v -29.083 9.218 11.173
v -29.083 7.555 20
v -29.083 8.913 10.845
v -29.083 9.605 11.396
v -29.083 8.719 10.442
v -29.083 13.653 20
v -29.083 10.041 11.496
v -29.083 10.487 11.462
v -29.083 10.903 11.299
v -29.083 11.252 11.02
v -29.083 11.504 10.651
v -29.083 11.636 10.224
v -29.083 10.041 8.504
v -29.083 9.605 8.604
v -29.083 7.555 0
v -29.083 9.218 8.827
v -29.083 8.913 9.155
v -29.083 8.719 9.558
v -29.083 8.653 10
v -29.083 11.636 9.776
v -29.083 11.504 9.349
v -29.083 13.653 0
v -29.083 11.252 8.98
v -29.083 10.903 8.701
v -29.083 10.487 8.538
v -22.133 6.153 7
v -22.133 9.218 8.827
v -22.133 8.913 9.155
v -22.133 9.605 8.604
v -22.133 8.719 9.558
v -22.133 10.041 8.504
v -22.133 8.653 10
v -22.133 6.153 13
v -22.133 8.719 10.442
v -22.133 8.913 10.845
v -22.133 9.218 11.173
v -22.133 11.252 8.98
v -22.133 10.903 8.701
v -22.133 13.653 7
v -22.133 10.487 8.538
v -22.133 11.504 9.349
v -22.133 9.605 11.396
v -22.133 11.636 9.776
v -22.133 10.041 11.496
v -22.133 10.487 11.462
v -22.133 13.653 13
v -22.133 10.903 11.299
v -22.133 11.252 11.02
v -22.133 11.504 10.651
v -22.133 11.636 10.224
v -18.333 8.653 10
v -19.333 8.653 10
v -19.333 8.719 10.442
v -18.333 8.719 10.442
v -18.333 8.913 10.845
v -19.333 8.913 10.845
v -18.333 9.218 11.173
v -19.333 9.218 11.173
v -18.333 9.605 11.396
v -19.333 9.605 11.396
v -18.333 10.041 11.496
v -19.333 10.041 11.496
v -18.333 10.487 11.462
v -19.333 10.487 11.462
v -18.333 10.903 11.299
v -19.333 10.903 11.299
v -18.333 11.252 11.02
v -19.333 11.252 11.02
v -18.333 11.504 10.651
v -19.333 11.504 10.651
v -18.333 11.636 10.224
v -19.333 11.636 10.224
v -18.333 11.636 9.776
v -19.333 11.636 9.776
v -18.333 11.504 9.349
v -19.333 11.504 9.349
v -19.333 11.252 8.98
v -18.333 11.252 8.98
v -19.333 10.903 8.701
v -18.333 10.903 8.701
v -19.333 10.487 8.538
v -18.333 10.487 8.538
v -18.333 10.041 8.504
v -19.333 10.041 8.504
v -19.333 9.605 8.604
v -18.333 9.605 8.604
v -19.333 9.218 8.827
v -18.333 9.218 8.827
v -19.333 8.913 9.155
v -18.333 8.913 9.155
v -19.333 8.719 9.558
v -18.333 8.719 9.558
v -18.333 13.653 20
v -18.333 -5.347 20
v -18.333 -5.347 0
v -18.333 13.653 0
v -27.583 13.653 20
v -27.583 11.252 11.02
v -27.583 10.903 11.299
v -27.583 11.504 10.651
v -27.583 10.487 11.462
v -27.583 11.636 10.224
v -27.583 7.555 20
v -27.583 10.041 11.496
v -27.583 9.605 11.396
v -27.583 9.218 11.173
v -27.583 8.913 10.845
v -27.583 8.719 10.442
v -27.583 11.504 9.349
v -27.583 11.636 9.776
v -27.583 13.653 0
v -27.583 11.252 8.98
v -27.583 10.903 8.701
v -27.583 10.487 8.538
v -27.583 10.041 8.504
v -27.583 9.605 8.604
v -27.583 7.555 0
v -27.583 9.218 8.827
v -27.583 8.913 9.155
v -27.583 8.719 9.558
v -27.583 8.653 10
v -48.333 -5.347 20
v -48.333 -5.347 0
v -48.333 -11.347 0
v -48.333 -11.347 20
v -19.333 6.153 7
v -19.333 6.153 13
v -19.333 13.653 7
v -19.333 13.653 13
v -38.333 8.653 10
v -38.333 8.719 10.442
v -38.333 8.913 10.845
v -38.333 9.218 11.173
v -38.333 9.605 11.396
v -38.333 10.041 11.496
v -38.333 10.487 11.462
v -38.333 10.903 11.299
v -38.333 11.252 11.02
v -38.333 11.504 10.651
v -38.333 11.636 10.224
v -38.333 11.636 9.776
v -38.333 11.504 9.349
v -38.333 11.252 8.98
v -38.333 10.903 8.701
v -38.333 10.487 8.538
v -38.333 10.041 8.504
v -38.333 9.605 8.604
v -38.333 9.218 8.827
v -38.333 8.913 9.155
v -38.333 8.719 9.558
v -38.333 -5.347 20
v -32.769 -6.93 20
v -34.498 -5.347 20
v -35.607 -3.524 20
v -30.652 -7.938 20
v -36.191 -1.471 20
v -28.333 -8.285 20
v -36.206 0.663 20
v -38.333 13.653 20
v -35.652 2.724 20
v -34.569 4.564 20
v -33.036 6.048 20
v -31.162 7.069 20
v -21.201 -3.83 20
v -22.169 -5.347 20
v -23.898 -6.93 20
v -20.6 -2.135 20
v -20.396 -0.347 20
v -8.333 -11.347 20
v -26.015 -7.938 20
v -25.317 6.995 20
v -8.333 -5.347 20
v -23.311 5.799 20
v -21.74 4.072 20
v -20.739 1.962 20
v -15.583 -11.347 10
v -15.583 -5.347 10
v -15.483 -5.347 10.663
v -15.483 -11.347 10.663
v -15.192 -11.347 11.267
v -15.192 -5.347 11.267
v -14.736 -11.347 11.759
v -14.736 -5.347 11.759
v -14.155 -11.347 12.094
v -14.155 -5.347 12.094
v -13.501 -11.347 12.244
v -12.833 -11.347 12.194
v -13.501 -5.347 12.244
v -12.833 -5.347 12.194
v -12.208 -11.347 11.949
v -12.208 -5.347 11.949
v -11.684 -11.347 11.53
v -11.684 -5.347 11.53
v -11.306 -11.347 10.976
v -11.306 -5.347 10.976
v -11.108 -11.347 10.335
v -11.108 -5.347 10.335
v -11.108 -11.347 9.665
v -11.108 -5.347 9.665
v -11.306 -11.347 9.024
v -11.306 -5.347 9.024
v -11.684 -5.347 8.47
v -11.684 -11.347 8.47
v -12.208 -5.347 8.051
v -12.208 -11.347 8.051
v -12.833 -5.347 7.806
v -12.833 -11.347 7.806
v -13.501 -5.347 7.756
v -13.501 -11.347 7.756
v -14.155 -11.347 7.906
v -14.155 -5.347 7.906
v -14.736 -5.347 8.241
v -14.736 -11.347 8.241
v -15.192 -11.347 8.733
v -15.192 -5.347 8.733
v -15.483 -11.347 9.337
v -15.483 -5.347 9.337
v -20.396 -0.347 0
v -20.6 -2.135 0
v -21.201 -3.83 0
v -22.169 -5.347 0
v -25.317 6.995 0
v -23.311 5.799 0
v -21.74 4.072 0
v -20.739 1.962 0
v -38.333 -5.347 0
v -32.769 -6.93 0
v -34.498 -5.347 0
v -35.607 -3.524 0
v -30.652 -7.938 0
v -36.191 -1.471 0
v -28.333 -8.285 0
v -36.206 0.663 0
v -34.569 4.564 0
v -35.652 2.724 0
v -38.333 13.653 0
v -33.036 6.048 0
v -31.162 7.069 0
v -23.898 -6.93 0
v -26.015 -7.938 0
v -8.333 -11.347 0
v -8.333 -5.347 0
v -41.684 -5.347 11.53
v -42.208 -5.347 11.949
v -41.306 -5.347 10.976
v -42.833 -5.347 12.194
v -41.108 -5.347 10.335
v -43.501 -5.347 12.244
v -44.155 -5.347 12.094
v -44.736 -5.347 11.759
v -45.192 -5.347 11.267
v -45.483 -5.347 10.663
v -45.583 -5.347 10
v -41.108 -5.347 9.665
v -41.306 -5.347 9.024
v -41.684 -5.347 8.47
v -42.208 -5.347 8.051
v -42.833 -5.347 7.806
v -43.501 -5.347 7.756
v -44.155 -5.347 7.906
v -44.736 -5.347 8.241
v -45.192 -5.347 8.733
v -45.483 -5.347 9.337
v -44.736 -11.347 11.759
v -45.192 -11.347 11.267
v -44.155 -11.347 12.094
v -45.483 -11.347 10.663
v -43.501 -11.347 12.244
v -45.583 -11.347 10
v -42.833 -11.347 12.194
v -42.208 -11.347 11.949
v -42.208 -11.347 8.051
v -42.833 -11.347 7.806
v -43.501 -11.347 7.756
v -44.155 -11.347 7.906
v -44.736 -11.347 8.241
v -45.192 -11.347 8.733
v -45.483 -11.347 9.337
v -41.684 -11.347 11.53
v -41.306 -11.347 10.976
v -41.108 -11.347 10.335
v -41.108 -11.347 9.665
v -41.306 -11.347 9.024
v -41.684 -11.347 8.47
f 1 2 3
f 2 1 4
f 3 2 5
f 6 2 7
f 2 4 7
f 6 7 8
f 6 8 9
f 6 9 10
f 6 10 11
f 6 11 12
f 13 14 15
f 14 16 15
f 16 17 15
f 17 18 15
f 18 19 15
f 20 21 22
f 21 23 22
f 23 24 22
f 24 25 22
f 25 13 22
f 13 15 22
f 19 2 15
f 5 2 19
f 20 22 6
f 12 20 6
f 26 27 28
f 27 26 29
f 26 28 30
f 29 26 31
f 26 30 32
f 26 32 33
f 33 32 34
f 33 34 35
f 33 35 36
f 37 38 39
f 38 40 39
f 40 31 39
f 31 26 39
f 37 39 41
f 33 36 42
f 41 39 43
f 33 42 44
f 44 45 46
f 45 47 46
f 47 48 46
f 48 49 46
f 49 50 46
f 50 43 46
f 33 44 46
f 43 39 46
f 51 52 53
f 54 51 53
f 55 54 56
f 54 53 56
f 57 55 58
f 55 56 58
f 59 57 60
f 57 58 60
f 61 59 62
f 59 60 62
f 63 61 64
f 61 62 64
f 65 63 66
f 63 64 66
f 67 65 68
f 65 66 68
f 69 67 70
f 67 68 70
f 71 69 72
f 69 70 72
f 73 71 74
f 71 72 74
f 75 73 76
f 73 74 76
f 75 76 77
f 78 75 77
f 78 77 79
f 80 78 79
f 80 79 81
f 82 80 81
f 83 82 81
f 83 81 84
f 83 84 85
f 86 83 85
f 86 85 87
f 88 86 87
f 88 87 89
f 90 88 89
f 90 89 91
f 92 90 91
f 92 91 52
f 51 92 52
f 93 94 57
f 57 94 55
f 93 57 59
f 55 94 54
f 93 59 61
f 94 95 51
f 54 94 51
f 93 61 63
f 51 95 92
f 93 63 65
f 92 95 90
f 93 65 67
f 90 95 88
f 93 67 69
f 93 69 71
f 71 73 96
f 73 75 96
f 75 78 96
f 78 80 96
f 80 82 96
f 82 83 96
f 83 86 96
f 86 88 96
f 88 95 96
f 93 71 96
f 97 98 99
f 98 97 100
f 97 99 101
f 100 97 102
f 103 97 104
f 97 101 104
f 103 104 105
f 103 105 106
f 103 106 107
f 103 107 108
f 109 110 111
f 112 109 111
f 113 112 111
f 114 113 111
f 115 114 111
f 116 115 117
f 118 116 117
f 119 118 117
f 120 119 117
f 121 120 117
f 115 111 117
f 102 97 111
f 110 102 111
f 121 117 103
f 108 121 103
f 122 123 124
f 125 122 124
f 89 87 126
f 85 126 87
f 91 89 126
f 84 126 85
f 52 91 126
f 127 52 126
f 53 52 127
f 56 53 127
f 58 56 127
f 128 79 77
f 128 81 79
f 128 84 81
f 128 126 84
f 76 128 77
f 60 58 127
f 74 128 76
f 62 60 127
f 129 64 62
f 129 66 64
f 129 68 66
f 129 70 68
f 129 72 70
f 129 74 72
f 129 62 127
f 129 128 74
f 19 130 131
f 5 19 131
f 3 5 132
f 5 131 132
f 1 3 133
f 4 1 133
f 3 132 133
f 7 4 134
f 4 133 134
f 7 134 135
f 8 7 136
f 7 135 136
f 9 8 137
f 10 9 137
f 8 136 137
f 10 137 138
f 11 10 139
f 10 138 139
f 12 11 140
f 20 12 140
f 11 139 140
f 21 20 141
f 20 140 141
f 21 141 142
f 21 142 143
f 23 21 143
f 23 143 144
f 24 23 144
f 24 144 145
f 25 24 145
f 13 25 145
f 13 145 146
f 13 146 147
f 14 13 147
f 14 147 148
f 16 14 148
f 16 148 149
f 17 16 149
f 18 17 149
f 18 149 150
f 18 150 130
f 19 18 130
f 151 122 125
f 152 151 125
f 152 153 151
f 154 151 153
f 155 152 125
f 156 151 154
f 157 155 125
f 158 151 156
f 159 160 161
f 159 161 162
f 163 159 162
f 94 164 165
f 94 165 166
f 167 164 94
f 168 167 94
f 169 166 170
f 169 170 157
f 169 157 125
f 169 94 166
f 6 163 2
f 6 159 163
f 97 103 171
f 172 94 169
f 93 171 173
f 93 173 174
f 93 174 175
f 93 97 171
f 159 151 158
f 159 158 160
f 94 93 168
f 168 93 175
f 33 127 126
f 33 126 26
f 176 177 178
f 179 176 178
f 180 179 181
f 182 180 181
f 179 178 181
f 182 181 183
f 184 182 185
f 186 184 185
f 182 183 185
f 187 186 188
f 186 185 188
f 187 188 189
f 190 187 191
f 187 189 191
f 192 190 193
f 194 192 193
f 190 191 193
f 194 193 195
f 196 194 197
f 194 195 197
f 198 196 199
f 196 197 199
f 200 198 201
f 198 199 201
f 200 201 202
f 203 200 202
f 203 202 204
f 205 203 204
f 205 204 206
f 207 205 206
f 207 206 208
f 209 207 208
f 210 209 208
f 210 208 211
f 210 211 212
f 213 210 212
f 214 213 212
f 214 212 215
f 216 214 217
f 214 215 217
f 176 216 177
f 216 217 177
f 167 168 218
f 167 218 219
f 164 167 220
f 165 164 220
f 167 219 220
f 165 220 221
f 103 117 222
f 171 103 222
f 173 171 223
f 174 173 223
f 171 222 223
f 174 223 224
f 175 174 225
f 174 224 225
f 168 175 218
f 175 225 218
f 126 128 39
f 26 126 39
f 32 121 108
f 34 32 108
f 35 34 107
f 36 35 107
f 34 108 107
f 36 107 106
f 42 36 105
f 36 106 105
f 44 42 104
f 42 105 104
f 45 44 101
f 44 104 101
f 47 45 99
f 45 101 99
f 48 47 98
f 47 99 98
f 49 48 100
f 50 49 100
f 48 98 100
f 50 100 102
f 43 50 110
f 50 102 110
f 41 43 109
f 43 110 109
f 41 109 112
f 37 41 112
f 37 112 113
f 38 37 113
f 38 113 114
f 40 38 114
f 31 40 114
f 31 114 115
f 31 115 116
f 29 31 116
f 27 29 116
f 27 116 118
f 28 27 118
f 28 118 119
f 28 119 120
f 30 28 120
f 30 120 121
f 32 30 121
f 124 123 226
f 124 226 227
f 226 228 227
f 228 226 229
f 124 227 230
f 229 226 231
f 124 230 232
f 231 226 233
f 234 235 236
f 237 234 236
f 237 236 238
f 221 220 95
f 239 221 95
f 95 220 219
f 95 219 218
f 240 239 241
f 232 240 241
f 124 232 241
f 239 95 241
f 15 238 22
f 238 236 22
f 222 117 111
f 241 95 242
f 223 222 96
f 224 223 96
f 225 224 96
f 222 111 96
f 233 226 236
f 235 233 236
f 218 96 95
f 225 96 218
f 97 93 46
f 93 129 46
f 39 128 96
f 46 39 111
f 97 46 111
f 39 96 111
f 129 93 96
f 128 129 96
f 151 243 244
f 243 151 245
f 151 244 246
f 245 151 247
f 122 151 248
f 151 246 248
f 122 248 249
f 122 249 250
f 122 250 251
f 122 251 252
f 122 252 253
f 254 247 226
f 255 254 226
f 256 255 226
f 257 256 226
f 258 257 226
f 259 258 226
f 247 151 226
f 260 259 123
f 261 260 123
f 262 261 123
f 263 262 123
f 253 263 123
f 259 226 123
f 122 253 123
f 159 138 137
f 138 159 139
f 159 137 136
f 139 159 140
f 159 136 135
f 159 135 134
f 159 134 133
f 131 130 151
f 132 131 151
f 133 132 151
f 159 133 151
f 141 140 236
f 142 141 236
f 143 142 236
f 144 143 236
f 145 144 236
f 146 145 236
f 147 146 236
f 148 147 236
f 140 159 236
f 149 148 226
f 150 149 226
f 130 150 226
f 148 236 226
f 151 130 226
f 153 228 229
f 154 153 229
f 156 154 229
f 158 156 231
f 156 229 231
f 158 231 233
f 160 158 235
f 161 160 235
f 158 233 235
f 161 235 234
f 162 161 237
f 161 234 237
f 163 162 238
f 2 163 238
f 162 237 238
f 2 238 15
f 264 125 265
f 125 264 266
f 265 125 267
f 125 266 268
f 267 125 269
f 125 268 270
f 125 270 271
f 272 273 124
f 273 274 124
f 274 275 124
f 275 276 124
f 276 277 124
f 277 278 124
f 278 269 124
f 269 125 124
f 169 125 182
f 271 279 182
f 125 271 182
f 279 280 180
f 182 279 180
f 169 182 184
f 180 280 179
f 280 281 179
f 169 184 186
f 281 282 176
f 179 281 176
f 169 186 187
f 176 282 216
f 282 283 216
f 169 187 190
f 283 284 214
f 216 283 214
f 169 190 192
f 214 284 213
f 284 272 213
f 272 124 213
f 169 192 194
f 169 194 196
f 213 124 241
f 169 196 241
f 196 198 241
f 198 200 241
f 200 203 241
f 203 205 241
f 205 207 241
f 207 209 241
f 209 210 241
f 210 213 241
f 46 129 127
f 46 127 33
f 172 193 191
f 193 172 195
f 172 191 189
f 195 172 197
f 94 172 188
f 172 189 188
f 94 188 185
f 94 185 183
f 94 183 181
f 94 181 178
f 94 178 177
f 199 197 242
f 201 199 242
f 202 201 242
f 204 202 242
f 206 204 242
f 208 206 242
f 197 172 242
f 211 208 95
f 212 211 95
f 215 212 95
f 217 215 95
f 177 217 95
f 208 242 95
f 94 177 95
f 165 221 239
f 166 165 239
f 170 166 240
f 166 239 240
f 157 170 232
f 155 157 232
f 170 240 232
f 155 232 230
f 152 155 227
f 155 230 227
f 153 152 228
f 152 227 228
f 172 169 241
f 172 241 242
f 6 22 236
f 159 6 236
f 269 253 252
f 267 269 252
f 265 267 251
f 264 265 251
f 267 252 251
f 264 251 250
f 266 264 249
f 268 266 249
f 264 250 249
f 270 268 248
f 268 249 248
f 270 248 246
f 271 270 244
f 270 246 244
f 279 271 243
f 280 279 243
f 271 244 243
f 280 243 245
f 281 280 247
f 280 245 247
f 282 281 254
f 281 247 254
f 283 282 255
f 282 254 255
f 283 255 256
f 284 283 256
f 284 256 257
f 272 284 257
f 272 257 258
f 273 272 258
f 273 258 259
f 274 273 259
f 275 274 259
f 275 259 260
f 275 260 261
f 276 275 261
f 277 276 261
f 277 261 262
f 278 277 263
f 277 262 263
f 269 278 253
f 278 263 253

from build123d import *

# Parameters (mm, degrees)
F1_DEPTH = 20
F2_R     = 1.5
F3_DEPTH = 20
F4_W     = 2.8
F4_H     = 6
F5_DEPTH = 7.5
F6_R     = 2.25
F7_DEPTH = 6


with BuildPart() as f1:
    # F0 (on Top) → F1 (new body)
    with BuildSketch(Plane.XY):
        with BuildLine():
            Line((-38.333333, 13.652778), (-38.333333, -5.347222))
            Line((-38.333333, -5.347222), (-34.498064, -5.347222))
            ThreePointArc((-34.498064, -5.347222), (-35.652397, 2.724457), (-29.083333, 7.554765))
            Line((-29.083333, 7.554765), (-29.083333, 13.652778))
            Line((-29.083333, 13.652778), (-38.333333, 13.652778))
        make_face()
        with BuildLine():
            Line((-48.333333, -5.347222), (-48.333333, -11.347222))
            Line((-48.333333, -11.347222), (-8.333333, -11.347222))
            Line((-8.333333, -11.347222), (-8.333333, -5.347222))
            Line((-8.333333, -5.347222), (-18.333333, -5.347222))
            Line((-18.333333, -5.347222), (-22.168602, -5.347222))
            ThreePointArc((-22.168602, -5.347222), (-28.333333, -8.284722), (-34.498064, -5.347222))
            Line((-34.498064, -5.347222), (-38.333333, -5.347222))
            Line((-38.333333, -5.347222), (-48.333333, -5.347222))
        make_face()
        with BuildLine():
            Line((-22.168602, -5.347222), (-18.333333, -5.347222))
            Line((-18.333333, -5.347222), (-18.333333, 13.652778))
            Line((-18.333333, 13.652778), (-27.583333, 13.652778))
            Line((-27.583333, 13.652778), (-27.583333, 7.554765))
            ThreePointArc((-27.583333, 7.554765), (-22.461492, 4.993694), (-20.395833, -0.347222))
            ThreePointArc((-20.395833, -0.347222), (-20.852142, -2.999707), (-22.168602, -5.347222))
        make_face()
    extrude(amount=F1_DEPTH)

    # F2 (on face) → F3 (cut)
    with BuildSketch(Plane(origin=(-38.333333, 0, 0), x_dir=(0, -1, 0), z_dir=(-1, 0, 0))):
        with Locations((-10.152778, 10)):
            Circle(F2_R)
    extrude(amount=-F3_DEPTH, mode=Mode.SUBTRACT)

    # F4 (on face) → F5 (cut)
    with BuildSketch(Plane(origin=(0, 13.652778, 0), x_dir=(-1, 0, 0), z_dir=(0, 1, 0))):
        with Locations((20.733333, 10)):
            Rectangle(F4_W, F4_H)
    extrude(amount=-F5_DEPTH, mode=Mode.SUBTRACT)

    # F6 (on face) → F7 (cut)
    with BuildSketch(Plane(origin=(0, -5.347222, 0), x_dir=(-1, 0, 0), z_dir=(0, 1, 0))):
        with Locations((43.333333, 10)):
            Circle(F6_R)
        with Locations((13.333333, 10)):
            Circle(F6_R)
    extrude(amount=-F7_DEPTH, mode=Mode.SUBTRACT)


solid = f1.part
